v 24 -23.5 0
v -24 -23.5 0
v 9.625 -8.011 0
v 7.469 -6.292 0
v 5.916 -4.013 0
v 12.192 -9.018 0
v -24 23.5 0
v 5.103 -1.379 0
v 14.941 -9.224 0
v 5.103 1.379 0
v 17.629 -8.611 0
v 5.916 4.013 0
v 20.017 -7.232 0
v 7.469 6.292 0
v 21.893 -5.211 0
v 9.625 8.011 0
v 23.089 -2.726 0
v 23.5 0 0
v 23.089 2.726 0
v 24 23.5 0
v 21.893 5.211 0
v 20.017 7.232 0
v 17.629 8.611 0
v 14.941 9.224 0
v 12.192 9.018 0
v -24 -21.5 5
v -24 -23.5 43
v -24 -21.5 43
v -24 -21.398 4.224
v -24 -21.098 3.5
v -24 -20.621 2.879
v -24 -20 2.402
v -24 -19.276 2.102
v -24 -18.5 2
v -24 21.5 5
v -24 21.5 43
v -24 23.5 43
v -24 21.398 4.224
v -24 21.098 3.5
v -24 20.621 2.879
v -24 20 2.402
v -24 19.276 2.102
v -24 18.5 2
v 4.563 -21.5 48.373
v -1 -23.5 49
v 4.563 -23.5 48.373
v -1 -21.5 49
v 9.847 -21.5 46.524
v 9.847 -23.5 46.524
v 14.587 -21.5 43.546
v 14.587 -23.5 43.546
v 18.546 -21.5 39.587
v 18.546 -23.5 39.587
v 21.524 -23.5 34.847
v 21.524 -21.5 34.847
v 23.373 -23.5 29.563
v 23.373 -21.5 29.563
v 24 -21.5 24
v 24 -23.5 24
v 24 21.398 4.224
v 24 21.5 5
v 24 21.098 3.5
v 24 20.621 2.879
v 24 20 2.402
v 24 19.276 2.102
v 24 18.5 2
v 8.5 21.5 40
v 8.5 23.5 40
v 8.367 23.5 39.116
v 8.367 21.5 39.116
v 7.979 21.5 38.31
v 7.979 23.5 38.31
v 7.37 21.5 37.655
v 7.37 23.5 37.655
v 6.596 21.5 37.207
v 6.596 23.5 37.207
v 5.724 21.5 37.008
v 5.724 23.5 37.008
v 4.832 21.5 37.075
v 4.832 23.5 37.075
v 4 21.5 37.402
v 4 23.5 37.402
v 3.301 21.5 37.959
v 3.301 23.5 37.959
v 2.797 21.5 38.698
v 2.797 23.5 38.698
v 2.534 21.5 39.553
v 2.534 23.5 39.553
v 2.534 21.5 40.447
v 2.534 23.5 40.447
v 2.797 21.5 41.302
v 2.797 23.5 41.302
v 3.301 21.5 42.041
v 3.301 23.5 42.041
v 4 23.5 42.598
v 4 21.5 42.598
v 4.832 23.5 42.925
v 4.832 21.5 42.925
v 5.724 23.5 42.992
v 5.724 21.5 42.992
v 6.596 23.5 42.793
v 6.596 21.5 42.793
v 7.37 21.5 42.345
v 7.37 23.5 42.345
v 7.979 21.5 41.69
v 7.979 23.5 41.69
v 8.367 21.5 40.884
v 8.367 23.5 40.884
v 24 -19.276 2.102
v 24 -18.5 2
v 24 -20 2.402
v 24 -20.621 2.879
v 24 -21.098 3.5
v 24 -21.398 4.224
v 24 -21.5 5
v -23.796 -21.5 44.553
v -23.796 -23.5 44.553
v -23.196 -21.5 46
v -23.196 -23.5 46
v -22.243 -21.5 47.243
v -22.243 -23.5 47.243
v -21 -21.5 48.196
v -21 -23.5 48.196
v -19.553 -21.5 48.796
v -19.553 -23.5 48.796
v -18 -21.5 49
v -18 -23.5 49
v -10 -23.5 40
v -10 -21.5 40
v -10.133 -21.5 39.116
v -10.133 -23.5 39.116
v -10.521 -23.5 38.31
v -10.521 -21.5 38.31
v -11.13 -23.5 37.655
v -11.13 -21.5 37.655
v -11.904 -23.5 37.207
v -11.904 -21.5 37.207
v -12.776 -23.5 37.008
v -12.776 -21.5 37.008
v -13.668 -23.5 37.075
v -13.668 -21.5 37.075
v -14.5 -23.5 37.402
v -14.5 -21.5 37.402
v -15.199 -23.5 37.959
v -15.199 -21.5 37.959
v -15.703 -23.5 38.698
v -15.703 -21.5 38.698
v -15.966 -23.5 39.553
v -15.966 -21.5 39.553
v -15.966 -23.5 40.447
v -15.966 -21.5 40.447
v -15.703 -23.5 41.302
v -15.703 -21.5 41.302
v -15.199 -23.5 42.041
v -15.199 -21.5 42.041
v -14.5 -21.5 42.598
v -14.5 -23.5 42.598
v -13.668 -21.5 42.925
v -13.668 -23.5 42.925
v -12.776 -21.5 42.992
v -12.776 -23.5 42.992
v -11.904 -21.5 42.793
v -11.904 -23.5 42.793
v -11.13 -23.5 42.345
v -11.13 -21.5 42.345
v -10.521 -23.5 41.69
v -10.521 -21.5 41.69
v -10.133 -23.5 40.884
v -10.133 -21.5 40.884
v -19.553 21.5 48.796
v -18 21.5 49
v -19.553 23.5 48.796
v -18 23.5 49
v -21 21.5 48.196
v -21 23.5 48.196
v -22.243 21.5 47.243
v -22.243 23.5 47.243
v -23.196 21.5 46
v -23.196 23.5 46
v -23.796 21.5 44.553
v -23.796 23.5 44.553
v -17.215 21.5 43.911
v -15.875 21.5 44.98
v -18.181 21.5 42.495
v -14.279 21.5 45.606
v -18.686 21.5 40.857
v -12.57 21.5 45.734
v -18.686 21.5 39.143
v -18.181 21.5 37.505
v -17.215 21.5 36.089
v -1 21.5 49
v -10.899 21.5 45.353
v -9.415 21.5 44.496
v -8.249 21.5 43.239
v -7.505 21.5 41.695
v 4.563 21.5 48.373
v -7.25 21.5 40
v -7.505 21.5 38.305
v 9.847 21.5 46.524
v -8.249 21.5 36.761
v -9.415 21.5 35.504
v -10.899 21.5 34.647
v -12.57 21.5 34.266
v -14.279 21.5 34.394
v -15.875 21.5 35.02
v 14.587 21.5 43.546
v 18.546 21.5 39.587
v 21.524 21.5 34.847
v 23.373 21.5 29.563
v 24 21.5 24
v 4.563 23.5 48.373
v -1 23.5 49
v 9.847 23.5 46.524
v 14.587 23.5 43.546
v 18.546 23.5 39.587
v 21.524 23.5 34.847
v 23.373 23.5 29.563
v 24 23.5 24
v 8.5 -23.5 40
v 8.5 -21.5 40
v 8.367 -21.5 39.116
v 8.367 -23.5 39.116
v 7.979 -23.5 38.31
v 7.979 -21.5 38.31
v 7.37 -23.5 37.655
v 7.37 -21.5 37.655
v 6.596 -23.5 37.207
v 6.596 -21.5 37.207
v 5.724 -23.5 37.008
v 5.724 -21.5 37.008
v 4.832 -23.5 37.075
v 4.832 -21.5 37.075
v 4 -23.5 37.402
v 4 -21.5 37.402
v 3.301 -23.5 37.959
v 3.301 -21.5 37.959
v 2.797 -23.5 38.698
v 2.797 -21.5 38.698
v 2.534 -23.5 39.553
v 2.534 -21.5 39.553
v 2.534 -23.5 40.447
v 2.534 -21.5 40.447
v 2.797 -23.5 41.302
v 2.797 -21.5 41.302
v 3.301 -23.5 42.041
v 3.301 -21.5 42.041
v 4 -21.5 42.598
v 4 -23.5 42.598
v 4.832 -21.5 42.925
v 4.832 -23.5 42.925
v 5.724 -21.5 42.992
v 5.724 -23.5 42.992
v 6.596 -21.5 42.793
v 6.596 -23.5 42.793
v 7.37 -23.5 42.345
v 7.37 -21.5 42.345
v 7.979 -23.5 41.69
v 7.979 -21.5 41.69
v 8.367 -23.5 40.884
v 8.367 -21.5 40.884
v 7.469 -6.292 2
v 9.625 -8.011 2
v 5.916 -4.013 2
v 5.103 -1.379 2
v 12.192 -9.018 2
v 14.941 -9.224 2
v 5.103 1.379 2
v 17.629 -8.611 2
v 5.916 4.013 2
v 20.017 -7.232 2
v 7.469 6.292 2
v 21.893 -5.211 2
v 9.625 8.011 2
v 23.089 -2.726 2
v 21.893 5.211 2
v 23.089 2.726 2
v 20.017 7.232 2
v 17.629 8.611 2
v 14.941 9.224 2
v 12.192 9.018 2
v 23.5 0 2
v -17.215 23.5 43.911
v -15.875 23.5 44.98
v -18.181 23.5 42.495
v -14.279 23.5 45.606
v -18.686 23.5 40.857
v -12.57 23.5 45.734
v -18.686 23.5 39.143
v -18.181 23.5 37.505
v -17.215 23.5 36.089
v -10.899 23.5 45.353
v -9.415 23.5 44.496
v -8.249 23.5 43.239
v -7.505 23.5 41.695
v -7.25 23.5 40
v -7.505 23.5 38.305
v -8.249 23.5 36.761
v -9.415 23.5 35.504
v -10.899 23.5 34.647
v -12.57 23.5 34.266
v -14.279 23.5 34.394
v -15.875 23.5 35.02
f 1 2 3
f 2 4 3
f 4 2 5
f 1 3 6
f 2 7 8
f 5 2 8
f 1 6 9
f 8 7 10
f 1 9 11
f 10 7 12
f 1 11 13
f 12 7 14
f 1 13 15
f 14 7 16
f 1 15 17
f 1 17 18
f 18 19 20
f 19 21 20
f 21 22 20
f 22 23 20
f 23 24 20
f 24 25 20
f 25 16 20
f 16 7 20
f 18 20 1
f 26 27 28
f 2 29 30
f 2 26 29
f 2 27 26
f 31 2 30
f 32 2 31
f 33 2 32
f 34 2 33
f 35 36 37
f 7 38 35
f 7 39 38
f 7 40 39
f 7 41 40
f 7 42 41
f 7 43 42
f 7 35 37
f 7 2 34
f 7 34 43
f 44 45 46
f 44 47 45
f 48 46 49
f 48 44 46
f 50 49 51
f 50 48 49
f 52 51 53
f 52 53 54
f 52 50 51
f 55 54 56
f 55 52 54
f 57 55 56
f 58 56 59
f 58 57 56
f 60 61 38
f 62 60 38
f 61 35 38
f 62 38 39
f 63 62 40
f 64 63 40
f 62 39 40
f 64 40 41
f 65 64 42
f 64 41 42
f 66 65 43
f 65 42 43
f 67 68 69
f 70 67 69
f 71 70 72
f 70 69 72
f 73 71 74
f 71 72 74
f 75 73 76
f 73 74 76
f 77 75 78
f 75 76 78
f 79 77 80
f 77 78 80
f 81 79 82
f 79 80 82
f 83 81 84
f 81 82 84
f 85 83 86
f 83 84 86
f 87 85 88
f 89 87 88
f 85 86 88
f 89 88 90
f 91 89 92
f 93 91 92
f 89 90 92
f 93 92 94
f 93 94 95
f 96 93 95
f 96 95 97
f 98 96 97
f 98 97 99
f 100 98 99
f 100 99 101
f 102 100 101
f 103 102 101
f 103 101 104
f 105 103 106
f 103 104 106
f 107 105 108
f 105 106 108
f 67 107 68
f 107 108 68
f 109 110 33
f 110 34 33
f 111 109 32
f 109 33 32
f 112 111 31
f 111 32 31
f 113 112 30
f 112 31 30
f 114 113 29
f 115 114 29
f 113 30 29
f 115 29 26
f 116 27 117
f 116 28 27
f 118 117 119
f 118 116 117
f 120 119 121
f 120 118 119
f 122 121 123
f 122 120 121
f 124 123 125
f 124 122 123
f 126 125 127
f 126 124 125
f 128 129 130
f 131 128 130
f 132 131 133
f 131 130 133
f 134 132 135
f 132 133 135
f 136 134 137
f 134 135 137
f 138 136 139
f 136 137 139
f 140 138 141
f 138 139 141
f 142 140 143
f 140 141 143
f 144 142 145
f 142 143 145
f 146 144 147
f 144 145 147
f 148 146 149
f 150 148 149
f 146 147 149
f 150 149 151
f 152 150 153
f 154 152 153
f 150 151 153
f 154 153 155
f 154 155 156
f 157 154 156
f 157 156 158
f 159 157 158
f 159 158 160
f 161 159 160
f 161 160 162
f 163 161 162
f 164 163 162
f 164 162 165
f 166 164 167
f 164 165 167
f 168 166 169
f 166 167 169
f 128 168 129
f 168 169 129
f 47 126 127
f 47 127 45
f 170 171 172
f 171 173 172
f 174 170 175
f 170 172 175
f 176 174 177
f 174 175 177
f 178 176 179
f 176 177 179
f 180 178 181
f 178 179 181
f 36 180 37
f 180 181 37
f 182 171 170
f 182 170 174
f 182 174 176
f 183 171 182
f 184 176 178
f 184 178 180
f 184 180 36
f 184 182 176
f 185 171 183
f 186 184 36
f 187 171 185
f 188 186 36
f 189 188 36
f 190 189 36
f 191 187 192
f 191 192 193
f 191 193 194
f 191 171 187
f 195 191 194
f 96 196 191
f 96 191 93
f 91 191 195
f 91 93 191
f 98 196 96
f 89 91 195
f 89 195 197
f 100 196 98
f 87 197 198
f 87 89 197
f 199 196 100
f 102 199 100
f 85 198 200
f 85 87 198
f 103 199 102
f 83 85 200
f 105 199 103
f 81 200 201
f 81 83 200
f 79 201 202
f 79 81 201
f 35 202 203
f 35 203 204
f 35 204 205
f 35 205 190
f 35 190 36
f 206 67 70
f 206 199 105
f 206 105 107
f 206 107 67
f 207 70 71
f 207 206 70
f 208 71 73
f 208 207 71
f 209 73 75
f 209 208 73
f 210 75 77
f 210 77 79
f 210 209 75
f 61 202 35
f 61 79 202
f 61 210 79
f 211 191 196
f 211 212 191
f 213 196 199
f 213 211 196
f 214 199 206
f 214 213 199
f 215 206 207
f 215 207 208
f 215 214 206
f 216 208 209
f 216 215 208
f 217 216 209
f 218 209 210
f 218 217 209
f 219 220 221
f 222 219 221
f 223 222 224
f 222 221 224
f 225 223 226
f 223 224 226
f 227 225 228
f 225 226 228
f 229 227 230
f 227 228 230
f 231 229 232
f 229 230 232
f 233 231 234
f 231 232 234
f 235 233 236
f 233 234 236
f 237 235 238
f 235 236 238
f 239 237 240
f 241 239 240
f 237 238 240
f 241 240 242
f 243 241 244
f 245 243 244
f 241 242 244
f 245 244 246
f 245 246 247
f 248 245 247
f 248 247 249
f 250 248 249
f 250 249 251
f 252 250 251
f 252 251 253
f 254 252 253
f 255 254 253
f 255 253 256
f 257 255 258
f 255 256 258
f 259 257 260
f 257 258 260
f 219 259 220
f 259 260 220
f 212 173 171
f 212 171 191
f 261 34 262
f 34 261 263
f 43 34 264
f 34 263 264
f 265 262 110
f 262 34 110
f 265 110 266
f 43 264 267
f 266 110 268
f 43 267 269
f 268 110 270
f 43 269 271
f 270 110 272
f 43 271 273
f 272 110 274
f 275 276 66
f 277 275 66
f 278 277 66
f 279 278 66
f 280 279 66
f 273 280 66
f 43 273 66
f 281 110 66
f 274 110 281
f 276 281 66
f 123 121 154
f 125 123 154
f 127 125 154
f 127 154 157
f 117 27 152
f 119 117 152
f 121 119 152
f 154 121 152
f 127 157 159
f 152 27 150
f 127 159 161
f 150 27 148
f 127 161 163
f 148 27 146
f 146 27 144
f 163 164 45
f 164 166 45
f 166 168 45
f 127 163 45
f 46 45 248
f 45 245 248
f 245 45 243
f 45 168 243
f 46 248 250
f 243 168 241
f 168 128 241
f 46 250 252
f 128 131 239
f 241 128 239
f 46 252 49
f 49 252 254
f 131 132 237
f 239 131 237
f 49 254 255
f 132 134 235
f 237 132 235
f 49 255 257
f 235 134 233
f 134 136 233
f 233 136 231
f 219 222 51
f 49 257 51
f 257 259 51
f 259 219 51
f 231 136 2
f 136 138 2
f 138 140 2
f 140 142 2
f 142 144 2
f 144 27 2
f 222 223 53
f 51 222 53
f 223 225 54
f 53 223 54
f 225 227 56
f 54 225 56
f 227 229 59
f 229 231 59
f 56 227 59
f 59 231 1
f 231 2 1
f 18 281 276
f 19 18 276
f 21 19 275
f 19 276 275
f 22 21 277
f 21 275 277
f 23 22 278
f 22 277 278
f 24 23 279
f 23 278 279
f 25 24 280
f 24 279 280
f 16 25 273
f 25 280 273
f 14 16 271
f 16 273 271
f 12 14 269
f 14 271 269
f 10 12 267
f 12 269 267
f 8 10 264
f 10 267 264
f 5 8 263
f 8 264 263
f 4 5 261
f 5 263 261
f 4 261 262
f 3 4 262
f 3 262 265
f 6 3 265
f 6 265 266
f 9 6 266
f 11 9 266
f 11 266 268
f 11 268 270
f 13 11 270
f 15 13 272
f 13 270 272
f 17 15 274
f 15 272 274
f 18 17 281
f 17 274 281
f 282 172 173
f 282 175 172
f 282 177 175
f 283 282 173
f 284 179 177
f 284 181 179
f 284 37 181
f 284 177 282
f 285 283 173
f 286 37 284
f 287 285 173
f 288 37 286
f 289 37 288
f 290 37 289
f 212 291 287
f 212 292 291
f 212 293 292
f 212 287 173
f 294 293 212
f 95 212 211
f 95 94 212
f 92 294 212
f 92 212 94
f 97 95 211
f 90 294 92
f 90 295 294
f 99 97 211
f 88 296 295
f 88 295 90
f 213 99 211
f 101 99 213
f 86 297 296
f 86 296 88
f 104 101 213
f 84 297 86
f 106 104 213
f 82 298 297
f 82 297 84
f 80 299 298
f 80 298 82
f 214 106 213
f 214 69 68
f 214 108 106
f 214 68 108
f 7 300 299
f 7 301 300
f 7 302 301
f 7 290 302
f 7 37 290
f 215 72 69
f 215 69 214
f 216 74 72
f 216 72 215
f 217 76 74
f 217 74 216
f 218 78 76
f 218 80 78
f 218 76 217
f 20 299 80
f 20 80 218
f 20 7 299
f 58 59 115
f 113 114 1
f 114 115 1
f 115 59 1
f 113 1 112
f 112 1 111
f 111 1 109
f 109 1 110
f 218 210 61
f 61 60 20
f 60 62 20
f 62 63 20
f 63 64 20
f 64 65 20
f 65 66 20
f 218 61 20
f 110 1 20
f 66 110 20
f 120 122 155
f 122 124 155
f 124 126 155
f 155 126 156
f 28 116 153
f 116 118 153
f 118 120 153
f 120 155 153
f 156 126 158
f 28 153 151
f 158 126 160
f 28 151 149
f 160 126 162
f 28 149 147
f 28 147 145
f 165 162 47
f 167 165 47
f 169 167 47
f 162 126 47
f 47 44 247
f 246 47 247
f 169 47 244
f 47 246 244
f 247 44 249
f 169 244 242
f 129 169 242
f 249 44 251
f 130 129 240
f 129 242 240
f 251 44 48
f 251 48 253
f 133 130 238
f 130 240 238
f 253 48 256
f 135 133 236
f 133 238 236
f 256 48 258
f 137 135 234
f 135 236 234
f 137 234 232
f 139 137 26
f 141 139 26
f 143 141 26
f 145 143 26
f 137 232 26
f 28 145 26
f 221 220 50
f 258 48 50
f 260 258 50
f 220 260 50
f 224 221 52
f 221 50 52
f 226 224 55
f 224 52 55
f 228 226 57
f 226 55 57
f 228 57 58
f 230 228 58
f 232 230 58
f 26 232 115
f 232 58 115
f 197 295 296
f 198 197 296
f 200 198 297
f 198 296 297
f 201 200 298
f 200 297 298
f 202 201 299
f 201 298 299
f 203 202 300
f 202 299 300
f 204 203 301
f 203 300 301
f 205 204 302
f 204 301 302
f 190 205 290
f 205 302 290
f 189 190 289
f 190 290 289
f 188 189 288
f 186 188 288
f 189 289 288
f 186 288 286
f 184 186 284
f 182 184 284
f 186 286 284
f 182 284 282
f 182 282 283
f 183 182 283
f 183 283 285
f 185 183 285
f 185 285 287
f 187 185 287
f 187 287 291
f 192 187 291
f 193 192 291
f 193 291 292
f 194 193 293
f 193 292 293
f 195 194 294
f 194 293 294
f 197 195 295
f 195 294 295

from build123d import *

# Parameters (mm, degrees)
SKETCH1_W           = 48
SKETCH1_H           = 47
BOSS_EXTRUDE1_DEPTH = 49
SKETCH3_W           = 50
SKETCH3_H           = 43
CUT_EXTRUDE1_DEPTH  = 49
SKETCH4_R           = 9.25
CUT_EXTRUDE2_DEPTH  = 2
SKETCH5_R           = 5.75
SKETCH5_R_2         = 3
CUT_EXTRUDE3_DEPTH  = 2
SKETCH7_R           = 3
CUT_EXTRUDE4_DEPTH  = 2
FILLET1_R           = 25
FILLET2_R           = 6
FILLET3_R           = 3


with BuildPart() as part:
    # Sketch1 → Boss-Extrude1 (new body)
    with BuildSketch(Plane.XY):
        Rectangle(SKETCH1_W, SKETCH1_H)
    extrude(amount=BOSS_EXTRUDE1_DEPTH)

    # Sketch3 → Cut-Extrude1 (cut)
    with BuildSketch(Plane(origin=(24, 0, 0), x_dir=(0, 0, -1), z_dir=(1, 0, 0))):
        with Locations((-27, 0)):
            Rectangle(SKETCH3_W, SKETCH3_H)
    extrude(amount=-CUT_EXTRUDE1_DEPTH, mode=Mode.SUBTRACT)

    # Sketch4 → Cut-Extrude2 (cut)
    with BuildSketch(Plane.XY.offset(2)):
        with Locations((14.25, 0)):
            Circle(SKETCH4_R)
    extrude(amount=-CUT_EXTRUDE2_DEPTH, mode=Mode.SUBTRACT)

    # Sketch5 → Cut-Extrude3 (cut)
    with BuildSketch(Plane(origin=(0, 23.5, 0), x_dir=(1, 0, 0), z_dir=(0, 1, 0))):
        with Locations((-13, -40)):
            Circle(SKETCH5_R)
        with Locations((5.5, -40)):
            Circle(SKETCH5_R_2)
    extrude(amount=-CUT_EXTRUDE3_DEPTH, mode=Mode.SUBTRACT)

    # Sketch7 → Cut-Extrude4 (cut)
    with BuildSketch(Plane(origin=(0, -21.5, 0), x_dir=(1, 0, 0), z_dir=(0, 1, 0))):
        with Locations((5.5, -40)):
            Circle(SKETCH7_R)
        with Locations((-13, -40)):
            Circle(SKETCH7_R)
    extrude(amount=-CUT_EXTRUDE4_DEPTH, mode=Mode.SUBTRACT)

    # Fillet1
    fillet1_edges = [part.edges().sort_by_distance(p)[0] for p in [
        (24, 22.5, 49),
        (24, -22.5, 49),
    ]]
    fillet(fillet1_edges, radius=FILLET1_R)

    # Fillet2
    fillet2_edges = [part.edges().sort_by_distance(p)[0] for p in [
        (-24, 22.5, 49),
        (-24, -22.5, 49),
    ]]
    fillet(fillet2_edges, radius=FILLET2_R)

    # Fillet3
    fillet3_edges = [part.edges().sort_by_distance(p)[0] for p in [
        (0, 21.5, 2),
        (0, -21.5, 2),
    ]]
    fillet(fillet3_edges, radius=FILLET3_R)


solid = part.part
